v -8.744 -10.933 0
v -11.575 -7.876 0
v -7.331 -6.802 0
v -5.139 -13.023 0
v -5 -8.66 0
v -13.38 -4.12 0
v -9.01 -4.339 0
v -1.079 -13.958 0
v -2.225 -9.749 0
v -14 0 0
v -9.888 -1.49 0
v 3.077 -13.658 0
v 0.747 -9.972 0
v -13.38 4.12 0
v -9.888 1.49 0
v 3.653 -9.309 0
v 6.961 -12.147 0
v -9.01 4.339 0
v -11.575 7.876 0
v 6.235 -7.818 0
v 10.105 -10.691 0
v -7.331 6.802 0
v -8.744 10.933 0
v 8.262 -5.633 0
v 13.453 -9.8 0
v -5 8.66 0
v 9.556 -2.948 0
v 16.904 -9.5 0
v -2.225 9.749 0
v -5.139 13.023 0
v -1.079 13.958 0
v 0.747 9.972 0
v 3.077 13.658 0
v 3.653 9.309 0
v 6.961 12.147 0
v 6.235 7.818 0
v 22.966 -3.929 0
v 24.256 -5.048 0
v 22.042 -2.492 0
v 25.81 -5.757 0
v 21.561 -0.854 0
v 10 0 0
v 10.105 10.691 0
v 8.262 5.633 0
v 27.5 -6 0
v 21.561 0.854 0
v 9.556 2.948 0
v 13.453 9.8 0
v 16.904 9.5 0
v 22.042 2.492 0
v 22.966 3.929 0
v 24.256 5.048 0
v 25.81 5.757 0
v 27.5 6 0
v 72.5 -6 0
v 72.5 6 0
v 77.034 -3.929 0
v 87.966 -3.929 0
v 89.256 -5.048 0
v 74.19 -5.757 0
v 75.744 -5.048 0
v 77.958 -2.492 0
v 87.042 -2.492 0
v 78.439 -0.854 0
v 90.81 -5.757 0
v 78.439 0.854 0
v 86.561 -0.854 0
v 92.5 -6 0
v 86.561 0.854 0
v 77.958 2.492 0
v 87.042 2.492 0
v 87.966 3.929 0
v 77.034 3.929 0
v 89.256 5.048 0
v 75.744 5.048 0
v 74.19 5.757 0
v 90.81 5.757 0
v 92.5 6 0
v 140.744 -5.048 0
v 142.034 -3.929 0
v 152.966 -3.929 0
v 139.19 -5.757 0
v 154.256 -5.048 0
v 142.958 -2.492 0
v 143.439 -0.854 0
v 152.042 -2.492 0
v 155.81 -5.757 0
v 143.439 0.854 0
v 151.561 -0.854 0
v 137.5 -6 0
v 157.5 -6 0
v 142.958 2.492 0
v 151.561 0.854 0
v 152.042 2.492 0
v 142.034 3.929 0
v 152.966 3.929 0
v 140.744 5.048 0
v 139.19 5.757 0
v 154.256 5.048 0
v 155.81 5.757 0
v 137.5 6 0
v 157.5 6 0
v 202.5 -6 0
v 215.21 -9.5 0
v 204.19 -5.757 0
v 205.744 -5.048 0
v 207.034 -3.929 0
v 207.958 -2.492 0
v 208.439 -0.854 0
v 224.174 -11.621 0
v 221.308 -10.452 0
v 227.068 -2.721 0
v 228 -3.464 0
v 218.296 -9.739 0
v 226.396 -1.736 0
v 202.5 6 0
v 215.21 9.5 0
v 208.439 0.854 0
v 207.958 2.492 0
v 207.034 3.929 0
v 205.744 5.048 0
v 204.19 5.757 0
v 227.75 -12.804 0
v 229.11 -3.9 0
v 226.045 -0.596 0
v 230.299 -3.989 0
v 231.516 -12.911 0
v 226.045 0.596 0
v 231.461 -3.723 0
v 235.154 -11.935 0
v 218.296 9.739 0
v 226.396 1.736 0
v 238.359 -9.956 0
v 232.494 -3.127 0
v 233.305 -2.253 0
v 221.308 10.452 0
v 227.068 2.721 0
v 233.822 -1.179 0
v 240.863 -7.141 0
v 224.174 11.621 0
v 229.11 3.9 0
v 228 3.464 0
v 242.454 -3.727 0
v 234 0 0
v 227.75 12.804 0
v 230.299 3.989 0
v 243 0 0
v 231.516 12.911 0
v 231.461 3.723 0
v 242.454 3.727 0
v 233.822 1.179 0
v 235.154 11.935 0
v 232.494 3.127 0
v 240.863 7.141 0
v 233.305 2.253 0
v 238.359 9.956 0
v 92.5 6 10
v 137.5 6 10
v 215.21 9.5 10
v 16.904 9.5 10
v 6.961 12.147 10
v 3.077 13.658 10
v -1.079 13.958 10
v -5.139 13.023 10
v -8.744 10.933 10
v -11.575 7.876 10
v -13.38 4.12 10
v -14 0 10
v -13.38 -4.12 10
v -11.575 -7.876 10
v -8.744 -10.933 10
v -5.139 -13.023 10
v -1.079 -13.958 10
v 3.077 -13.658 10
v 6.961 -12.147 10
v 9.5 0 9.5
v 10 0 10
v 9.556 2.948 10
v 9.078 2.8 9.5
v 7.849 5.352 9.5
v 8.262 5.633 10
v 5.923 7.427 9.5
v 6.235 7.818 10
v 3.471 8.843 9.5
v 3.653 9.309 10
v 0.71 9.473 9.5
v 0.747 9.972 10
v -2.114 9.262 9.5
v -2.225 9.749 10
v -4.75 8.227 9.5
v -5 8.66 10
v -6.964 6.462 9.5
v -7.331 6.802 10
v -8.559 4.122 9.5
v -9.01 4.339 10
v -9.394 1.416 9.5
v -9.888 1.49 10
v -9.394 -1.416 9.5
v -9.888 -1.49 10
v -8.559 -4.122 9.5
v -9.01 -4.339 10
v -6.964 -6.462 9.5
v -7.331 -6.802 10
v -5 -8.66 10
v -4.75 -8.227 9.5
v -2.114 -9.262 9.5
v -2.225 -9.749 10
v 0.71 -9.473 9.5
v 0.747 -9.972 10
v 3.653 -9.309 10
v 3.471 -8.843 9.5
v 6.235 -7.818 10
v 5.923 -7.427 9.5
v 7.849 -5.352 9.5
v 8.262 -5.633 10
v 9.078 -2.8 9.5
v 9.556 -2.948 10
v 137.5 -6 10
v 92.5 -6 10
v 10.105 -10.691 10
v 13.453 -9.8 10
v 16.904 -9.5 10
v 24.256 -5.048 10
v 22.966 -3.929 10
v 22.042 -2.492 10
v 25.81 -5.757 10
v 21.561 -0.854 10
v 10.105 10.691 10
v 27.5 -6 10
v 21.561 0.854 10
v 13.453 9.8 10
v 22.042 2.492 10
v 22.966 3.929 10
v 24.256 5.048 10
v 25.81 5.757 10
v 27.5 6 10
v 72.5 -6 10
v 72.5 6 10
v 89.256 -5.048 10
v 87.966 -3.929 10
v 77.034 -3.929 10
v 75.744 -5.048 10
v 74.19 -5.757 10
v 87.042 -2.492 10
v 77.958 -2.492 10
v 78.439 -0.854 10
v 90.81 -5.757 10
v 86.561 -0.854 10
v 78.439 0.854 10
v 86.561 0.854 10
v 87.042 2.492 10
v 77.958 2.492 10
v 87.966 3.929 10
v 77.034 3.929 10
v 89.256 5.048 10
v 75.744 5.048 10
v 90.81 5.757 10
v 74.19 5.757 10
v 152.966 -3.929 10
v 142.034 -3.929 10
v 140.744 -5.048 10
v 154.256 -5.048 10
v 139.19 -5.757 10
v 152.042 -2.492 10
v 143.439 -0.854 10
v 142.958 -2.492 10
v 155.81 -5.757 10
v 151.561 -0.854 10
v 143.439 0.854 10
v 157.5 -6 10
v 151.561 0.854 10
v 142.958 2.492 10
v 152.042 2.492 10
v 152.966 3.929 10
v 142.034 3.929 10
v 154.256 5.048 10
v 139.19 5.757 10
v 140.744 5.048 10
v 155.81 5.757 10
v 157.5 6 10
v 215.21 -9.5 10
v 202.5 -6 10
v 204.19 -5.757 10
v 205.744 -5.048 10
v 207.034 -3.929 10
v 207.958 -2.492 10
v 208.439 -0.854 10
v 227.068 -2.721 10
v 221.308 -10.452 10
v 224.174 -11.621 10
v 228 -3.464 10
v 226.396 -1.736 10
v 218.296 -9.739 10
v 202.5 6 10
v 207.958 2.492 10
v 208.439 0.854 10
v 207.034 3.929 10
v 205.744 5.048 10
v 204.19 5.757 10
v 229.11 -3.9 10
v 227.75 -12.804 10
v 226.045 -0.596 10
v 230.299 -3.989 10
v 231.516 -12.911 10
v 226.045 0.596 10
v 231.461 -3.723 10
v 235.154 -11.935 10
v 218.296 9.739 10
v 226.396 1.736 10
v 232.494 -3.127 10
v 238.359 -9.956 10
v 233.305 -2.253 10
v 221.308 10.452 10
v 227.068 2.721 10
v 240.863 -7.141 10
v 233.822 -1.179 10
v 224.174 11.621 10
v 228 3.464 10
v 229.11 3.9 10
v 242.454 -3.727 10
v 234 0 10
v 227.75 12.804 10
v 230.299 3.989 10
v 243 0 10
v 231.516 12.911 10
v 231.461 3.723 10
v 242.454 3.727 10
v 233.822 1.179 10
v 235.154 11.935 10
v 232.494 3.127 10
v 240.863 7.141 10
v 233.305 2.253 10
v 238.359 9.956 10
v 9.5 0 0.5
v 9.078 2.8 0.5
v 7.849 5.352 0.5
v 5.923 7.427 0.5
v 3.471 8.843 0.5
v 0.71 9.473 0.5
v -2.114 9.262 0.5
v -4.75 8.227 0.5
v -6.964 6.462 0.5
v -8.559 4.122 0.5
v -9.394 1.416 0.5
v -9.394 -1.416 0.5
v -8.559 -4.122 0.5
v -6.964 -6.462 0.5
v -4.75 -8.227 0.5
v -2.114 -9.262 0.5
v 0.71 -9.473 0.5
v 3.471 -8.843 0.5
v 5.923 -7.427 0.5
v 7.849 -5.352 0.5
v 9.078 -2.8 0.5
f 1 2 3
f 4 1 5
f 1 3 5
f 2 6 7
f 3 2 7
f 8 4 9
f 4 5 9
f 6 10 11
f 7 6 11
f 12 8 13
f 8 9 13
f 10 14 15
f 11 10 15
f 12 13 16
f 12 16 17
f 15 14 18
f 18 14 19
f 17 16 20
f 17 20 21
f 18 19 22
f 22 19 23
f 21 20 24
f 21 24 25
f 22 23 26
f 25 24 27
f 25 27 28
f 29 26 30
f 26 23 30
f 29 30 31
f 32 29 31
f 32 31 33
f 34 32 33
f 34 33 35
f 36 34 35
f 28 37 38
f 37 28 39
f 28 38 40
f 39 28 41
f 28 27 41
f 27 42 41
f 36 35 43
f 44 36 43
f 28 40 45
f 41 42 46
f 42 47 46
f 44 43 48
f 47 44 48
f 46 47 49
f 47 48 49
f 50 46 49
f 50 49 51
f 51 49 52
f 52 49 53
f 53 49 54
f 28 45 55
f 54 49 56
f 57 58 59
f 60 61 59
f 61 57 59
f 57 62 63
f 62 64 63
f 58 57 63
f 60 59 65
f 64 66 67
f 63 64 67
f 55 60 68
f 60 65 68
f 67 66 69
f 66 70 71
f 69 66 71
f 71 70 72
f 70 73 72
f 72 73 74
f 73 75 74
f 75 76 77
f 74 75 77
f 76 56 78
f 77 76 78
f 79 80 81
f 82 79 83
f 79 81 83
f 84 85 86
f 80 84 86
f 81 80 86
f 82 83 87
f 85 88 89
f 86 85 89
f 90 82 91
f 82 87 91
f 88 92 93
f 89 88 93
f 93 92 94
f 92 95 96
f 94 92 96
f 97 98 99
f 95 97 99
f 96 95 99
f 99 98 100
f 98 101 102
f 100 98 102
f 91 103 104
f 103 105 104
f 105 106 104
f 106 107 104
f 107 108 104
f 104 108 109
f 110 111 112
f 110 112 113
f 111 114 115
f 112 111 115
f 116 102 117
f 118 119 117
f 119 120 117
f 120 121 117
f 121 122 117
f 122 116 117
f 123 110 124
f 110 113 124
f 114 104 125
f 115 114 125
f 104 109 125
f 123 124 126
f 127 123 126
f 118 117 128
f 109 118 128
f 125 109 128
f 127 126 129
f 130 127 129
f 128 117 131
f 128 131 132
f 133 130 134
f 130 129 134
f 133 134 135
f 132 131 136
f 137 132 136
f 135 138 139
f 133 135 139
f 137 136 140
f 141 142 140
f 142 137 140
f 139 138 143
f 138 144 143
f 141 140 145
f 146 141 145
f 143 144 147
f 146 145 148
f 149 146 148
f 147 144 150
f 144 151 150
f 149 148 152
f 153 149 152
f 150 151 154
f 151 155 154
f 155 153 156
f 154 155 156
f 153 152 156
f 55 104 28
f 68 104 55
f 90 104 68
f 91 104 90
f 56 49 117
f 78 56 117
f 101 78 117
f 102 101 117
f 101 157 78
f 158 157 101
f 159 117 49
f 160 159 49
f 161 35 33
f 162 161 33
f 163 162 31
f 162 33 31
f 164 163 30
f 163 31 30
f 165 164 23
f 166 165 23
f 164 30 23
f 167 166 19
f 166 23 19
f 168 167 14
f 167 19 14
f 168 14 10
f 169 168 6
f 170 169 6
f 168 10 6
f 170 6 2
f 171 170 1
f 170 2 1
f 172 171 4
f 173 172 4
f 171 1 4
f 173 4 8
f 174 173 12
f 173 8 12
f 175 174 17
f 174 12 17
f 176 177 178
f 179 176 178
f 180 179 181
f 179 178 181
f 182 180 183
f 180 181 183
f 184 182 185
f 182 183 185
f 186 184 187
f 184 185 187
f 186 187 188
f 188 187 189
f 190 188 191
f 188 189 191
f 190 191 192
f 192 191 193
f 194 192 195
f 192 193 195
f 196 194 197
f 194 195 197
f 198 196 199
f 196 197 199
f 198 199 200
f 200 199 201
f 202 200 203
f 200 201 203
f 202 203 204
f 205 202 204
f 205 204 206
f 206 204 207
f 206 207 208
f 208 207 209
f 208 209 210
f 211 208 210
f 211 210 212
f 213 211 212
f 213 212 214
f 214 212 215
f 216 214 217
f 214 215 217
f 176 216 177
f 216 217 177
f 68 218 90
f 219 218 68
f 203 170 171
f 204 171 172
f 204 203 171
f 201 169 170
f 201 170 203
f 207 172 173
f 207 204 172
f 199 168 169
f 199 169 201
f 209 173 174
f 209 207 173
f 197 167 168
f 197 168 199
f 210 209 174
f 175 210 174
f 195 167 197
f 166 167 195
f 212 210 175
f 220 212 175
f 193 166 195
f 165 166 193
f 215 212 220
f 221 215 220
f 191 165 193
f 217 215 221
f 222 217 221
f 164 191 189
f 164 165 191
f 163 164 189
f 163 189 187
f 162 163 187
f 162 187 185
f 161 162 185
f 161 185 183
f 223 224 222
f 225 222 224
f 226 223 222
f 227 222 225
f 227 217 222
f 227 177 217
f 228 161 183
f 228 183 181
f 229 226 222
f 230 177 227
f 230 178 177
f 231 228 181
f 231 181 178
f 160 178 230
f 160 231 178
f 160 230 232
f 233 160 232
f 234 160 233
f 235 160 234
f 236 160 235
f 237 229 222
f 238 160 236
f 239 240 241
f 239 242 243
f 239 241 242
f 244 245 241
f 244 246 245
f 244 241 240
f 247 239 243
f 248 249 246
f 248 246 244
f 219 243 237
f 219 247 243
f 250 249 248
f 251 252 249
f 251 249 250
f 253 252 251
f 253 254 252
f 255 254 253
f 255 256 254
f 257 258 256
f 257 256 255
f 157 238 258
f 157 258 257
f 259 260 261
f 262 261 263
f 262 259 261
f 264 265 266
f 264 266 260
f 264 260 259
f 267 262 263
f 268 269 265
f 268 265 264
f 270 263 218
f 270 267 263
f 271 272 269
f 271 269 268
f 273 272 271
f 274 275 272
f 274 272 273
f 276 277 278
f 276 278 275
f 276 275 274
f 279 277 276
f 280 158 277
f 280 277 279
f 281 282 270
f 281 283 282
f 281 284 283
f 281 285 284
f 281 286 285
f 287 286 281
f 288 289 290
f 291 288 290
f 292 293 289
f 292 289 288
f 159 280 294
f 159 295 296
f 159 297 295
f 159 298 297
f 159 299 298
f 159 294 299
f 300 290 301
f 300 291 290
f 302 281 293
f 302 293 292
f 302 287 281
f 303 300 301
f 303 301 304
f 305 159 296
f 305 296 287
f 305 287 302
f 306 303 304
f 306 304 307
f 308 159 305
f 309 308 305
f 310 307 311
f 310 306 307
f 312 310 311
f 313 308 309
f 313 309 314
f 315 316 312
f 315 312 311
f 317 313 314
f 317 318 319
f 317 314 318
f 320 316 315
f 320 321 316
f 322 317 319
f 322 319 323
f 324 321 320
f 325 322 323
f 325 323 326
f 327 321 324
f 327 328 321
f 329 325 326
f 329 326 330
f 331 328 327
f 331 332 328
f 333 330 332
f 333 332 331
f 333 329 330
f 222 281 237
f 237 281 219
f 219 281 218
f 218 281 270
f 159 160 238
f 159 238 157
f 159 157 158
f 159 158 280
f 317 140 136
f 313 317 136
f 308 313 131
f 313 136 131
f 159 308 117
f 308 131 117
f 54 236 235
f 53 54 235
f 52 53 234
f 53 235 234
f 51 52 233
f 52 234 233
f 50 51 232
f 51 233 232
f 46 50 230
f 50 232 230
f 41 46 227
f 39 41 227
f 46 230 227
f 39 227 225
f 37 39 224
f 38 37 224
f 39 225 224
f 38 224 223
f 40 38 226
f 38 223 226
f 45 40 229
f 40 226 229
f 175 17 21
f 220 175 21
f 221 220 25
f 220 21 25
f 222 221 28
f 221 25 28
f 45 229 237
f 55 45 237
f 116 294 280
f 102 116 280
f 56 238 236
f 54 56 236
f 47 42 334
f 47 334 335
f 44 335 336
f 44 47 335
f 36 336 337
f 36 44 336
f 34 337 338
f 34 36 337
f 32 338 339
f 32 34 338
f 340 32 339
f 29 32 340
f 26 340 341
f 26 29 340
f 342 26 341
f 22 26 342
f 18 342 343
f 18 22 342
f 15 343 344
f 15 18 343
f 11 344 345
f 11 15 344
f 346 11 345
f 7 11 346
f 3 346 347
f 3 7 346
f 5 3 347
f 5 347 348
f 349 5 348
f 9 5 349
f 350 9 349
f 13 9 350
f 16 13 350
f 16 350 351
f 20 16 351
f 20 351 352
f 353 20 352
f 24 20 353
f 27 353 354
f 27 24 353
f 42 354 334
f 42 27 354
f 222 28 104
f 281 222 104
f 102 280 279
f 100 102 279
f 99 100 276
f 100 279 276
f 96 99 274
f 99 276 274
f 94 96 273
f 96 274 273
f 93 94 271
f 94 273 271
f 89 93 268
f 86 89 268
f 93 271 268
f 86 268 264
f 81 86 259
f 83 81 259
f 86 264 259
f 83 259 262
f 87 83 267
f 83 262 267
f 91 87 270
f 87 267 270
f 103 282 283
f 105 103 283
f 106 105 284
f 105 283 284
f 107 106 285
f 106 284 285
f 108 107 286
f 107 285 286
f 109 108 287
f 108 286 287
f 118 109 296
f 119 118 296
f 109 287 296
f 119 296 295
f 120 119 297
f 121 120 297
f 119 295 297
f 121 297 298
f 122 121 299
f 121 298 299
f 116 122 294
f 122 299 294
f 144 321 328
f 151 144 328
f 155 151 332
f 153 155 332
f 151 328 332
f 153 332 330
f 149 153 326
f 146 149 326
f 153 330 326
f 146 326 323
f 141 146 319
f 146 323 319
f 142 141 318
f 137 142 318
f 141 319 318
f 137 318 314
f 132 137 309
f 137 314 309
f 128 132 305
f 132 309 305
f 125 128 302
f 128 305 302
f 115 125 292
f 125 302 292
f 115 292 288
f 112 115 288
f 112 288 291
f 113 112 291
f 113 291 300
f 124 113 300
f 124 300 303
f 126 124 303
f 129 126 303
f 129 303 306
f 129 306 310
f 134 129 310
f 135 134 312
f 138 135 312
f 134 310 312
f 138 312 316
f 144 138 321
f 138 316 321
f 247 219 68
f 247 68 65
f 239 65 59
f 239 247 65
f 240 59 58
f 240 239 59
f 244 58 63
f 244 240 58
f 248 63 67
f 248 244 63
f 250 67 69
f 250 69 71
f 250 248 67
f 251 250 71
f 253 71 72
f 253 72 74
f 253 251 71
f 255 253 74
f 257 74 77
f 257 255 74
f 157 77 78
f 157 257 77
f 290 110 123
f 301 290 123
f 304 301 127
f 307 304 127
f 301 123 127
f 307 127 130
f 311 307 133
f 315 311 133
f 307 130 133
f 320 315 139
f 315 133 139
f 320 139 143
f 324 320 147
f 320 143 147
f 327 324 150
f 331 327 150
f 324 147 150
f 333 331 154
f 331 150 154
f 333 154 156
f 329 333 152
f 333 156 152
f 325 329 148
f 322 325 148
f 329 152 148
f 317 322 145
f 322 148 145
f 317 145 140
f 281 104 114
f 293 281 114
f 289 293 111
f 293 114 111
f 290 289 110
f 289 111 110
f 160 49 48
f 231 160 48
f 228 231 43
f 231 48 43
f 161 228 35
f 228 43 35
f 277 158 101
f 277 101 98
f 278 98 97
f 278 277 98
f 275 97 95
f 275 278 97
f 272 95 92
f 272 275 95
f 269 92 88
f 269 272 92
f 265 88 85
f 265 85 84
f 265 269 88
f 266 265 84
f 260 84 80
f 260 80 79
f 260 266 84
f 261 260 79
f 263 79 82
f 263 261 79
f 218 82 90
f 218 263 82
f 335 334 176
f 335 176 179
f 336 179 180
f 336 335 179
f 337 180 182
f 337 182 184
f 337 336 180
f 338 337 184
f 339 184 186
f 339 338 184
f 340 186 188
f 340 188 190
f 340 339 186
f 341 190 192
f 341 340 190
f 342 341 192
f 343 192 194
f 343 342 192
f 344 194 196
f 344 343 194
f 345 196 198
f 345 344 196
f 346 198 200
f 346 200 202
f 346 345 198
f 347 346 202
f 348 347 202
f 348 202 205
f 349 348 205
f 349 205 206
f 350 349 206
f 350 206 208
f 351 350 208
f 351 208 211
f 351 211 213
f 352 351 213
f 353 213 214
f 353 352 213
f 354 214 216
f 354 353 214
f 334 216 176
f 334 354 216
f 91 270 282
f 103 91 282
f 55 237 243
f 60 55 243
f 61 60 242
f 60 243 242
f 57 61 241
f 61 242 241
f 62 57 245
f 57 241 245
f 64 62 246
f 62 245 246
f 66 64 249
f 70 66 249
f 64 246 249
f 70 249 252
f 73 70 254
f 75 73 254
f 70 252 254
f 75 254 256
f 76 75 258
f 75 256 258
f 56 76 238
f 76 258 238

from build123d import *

# Parameters (mm, degrees)
SKETCH_1_R          = 9.5
EXTRUDE_1_DEPTH     = 10
CHAMFER_1_SIZE      = 0.5
CUT_EXTRUDE_2_DEPTH = 10
EXTRUDE_START       = -10
SKETCH_3_R          = 9.5
SKETCH_3_R_2        = 4
EXTRUDE_2_DEPTH     = 10
SKETCH_4_R          = 6
CUT_EXTRUDE_3_DEPTH = 10
SKETCH_5_R          = 6
SKETCH_5_R_2        = 4
EXTRUDE_3_DEPTH     = 10


with BuildPart() as part:
    # 草图1 → 凸台-拉伸1 (new body)
    with BuildSketch(Plane.XY):
        with BuildLine():
            Line((16.904141504, -9.5), (212.802616478, -9.5))
            Line((212.802616478, -9.5), (215.209800542, -9.5))
            ThreePointArc((215.209800542, -9.5), (219.815462407, -10.037526396), (224.173557789, -11.621212121))
            ThreePointArc((224.173557789, -11.621212121), (243, 0), (224.173557789, 11.621212121))
            ThreePointArc((224.173557789, 11.621212121), (219.815462407, 10.037526396), (215.209800542, 9.5))
            Line((215.209800542, 9.5), (212.802616478, 9.5))
            Line((212.802616478, 9.5), (16.904141504, 9.5))
            ThreePointArc((16.904141504, 9.5), (11.75918395, 10.173090993), (6.960528855, 12.147058824))
            ThreePointArc((6.960528855, 12.147058824), (-14, 0), (6.960528855, -12.147058824))
            ThreePointArc((6.960528855, -12.147058824), (11.75918395, -10.173090993), (16.904141504, -9.5))
        make_face()
        Circle(SKETCH_1_R, mode=Mode.SUBTRACT)
        with Locations((230, 0)):
            Circle(SKETCH_1_R, mode=Mode.SUBTRACT)
    extrude(amount=EXTRUDE_1_DEPTH)

    # 倒角1
    chamfer_1_edges = [part.edges().sort_by_distance(p)[0] for p in [
        (-9.5, 0, 0),
        (-9.5, 0, 10),
    ]]
    chamfer(chamfer_1_edges, length=CHAMFER_1_SIZE)

    # 草图2 → 切除-拉伸2 (cut)
    with BuildSketch(Plane.XY.offset(10)):
        with BuildLine():
            Line((137.499999918, -6), (92.5, -6))
            ThreePointArc((92.5, -6), (86.5, 0), (92.5, 6))
            Line((92.5, 6), (137.499999918, 6))
            ThreePointArc((137.499999918, 6), (143.499999918, 0), (137.499999918, -6))
        make_face()
        with BuildLine():
            Line((27.5, -6), (72.5, -6))
            ThreePointArc((72.5, -6), (78.5, 0), (72.5, 6))
            Line((72.5, 6), (27.5, 6))
            ThreePointArc((27.5, 6), (21.5, 0), (27.5, -6))
        make_face()
        with BuildLine():
            Line((157.5, -6), (202.5, -6))
            ThreePointArc((202.5, -6), (208.5, 0), (202.5, 6))
            Line((202.5, 6), (157.5, 6))
            ThreePointArc((157.5, 6), (151.5, 0), (157.5, -6))
        make_face()
    extrude(amount=-CUT_EXTRUDE_2_DEPTH, mode=Mode.SUBTRACT)

    # 草图3 → 凸台-拉伸2 (add)
    with BuildSketch(Plane.XY.offset(10).offset(EXTRUDE_START)):
        with Locations((230, 0)):
            Circle(SKETCH_3_R)
        with Locations((230, 0)):
            Circle(SKETCH_3_R_2, mode=Mode.SUBTRACT)
    extrude(amount=EXTRUDE_2_DEPTH)

    # 草图4 → 切除-拉伸3 (cut)
    with BuildSketch(Plane.XY.offset(10)):
        with Locations((230, 0)):
            Circle(SKETCH_4_R)
    extrude(amount=-CUT_EXTRUDE_3_DEPTH, mode=Mode.SUBTRACT)

    # 草图5 → 凸台-拉伸3 (add)
    with BuildSketch(Plane.XY.offset(10)):
        with Locations((230, 0)):
            Circle(SKETCH_5_R)
        with Locations((230, 0)):
            Circle(SKETCH_5_R_2, mode=Mode.SUBTRACT)
    extrude(amount=-EXTRUDE_3_DEPTH)


solid = part.part
